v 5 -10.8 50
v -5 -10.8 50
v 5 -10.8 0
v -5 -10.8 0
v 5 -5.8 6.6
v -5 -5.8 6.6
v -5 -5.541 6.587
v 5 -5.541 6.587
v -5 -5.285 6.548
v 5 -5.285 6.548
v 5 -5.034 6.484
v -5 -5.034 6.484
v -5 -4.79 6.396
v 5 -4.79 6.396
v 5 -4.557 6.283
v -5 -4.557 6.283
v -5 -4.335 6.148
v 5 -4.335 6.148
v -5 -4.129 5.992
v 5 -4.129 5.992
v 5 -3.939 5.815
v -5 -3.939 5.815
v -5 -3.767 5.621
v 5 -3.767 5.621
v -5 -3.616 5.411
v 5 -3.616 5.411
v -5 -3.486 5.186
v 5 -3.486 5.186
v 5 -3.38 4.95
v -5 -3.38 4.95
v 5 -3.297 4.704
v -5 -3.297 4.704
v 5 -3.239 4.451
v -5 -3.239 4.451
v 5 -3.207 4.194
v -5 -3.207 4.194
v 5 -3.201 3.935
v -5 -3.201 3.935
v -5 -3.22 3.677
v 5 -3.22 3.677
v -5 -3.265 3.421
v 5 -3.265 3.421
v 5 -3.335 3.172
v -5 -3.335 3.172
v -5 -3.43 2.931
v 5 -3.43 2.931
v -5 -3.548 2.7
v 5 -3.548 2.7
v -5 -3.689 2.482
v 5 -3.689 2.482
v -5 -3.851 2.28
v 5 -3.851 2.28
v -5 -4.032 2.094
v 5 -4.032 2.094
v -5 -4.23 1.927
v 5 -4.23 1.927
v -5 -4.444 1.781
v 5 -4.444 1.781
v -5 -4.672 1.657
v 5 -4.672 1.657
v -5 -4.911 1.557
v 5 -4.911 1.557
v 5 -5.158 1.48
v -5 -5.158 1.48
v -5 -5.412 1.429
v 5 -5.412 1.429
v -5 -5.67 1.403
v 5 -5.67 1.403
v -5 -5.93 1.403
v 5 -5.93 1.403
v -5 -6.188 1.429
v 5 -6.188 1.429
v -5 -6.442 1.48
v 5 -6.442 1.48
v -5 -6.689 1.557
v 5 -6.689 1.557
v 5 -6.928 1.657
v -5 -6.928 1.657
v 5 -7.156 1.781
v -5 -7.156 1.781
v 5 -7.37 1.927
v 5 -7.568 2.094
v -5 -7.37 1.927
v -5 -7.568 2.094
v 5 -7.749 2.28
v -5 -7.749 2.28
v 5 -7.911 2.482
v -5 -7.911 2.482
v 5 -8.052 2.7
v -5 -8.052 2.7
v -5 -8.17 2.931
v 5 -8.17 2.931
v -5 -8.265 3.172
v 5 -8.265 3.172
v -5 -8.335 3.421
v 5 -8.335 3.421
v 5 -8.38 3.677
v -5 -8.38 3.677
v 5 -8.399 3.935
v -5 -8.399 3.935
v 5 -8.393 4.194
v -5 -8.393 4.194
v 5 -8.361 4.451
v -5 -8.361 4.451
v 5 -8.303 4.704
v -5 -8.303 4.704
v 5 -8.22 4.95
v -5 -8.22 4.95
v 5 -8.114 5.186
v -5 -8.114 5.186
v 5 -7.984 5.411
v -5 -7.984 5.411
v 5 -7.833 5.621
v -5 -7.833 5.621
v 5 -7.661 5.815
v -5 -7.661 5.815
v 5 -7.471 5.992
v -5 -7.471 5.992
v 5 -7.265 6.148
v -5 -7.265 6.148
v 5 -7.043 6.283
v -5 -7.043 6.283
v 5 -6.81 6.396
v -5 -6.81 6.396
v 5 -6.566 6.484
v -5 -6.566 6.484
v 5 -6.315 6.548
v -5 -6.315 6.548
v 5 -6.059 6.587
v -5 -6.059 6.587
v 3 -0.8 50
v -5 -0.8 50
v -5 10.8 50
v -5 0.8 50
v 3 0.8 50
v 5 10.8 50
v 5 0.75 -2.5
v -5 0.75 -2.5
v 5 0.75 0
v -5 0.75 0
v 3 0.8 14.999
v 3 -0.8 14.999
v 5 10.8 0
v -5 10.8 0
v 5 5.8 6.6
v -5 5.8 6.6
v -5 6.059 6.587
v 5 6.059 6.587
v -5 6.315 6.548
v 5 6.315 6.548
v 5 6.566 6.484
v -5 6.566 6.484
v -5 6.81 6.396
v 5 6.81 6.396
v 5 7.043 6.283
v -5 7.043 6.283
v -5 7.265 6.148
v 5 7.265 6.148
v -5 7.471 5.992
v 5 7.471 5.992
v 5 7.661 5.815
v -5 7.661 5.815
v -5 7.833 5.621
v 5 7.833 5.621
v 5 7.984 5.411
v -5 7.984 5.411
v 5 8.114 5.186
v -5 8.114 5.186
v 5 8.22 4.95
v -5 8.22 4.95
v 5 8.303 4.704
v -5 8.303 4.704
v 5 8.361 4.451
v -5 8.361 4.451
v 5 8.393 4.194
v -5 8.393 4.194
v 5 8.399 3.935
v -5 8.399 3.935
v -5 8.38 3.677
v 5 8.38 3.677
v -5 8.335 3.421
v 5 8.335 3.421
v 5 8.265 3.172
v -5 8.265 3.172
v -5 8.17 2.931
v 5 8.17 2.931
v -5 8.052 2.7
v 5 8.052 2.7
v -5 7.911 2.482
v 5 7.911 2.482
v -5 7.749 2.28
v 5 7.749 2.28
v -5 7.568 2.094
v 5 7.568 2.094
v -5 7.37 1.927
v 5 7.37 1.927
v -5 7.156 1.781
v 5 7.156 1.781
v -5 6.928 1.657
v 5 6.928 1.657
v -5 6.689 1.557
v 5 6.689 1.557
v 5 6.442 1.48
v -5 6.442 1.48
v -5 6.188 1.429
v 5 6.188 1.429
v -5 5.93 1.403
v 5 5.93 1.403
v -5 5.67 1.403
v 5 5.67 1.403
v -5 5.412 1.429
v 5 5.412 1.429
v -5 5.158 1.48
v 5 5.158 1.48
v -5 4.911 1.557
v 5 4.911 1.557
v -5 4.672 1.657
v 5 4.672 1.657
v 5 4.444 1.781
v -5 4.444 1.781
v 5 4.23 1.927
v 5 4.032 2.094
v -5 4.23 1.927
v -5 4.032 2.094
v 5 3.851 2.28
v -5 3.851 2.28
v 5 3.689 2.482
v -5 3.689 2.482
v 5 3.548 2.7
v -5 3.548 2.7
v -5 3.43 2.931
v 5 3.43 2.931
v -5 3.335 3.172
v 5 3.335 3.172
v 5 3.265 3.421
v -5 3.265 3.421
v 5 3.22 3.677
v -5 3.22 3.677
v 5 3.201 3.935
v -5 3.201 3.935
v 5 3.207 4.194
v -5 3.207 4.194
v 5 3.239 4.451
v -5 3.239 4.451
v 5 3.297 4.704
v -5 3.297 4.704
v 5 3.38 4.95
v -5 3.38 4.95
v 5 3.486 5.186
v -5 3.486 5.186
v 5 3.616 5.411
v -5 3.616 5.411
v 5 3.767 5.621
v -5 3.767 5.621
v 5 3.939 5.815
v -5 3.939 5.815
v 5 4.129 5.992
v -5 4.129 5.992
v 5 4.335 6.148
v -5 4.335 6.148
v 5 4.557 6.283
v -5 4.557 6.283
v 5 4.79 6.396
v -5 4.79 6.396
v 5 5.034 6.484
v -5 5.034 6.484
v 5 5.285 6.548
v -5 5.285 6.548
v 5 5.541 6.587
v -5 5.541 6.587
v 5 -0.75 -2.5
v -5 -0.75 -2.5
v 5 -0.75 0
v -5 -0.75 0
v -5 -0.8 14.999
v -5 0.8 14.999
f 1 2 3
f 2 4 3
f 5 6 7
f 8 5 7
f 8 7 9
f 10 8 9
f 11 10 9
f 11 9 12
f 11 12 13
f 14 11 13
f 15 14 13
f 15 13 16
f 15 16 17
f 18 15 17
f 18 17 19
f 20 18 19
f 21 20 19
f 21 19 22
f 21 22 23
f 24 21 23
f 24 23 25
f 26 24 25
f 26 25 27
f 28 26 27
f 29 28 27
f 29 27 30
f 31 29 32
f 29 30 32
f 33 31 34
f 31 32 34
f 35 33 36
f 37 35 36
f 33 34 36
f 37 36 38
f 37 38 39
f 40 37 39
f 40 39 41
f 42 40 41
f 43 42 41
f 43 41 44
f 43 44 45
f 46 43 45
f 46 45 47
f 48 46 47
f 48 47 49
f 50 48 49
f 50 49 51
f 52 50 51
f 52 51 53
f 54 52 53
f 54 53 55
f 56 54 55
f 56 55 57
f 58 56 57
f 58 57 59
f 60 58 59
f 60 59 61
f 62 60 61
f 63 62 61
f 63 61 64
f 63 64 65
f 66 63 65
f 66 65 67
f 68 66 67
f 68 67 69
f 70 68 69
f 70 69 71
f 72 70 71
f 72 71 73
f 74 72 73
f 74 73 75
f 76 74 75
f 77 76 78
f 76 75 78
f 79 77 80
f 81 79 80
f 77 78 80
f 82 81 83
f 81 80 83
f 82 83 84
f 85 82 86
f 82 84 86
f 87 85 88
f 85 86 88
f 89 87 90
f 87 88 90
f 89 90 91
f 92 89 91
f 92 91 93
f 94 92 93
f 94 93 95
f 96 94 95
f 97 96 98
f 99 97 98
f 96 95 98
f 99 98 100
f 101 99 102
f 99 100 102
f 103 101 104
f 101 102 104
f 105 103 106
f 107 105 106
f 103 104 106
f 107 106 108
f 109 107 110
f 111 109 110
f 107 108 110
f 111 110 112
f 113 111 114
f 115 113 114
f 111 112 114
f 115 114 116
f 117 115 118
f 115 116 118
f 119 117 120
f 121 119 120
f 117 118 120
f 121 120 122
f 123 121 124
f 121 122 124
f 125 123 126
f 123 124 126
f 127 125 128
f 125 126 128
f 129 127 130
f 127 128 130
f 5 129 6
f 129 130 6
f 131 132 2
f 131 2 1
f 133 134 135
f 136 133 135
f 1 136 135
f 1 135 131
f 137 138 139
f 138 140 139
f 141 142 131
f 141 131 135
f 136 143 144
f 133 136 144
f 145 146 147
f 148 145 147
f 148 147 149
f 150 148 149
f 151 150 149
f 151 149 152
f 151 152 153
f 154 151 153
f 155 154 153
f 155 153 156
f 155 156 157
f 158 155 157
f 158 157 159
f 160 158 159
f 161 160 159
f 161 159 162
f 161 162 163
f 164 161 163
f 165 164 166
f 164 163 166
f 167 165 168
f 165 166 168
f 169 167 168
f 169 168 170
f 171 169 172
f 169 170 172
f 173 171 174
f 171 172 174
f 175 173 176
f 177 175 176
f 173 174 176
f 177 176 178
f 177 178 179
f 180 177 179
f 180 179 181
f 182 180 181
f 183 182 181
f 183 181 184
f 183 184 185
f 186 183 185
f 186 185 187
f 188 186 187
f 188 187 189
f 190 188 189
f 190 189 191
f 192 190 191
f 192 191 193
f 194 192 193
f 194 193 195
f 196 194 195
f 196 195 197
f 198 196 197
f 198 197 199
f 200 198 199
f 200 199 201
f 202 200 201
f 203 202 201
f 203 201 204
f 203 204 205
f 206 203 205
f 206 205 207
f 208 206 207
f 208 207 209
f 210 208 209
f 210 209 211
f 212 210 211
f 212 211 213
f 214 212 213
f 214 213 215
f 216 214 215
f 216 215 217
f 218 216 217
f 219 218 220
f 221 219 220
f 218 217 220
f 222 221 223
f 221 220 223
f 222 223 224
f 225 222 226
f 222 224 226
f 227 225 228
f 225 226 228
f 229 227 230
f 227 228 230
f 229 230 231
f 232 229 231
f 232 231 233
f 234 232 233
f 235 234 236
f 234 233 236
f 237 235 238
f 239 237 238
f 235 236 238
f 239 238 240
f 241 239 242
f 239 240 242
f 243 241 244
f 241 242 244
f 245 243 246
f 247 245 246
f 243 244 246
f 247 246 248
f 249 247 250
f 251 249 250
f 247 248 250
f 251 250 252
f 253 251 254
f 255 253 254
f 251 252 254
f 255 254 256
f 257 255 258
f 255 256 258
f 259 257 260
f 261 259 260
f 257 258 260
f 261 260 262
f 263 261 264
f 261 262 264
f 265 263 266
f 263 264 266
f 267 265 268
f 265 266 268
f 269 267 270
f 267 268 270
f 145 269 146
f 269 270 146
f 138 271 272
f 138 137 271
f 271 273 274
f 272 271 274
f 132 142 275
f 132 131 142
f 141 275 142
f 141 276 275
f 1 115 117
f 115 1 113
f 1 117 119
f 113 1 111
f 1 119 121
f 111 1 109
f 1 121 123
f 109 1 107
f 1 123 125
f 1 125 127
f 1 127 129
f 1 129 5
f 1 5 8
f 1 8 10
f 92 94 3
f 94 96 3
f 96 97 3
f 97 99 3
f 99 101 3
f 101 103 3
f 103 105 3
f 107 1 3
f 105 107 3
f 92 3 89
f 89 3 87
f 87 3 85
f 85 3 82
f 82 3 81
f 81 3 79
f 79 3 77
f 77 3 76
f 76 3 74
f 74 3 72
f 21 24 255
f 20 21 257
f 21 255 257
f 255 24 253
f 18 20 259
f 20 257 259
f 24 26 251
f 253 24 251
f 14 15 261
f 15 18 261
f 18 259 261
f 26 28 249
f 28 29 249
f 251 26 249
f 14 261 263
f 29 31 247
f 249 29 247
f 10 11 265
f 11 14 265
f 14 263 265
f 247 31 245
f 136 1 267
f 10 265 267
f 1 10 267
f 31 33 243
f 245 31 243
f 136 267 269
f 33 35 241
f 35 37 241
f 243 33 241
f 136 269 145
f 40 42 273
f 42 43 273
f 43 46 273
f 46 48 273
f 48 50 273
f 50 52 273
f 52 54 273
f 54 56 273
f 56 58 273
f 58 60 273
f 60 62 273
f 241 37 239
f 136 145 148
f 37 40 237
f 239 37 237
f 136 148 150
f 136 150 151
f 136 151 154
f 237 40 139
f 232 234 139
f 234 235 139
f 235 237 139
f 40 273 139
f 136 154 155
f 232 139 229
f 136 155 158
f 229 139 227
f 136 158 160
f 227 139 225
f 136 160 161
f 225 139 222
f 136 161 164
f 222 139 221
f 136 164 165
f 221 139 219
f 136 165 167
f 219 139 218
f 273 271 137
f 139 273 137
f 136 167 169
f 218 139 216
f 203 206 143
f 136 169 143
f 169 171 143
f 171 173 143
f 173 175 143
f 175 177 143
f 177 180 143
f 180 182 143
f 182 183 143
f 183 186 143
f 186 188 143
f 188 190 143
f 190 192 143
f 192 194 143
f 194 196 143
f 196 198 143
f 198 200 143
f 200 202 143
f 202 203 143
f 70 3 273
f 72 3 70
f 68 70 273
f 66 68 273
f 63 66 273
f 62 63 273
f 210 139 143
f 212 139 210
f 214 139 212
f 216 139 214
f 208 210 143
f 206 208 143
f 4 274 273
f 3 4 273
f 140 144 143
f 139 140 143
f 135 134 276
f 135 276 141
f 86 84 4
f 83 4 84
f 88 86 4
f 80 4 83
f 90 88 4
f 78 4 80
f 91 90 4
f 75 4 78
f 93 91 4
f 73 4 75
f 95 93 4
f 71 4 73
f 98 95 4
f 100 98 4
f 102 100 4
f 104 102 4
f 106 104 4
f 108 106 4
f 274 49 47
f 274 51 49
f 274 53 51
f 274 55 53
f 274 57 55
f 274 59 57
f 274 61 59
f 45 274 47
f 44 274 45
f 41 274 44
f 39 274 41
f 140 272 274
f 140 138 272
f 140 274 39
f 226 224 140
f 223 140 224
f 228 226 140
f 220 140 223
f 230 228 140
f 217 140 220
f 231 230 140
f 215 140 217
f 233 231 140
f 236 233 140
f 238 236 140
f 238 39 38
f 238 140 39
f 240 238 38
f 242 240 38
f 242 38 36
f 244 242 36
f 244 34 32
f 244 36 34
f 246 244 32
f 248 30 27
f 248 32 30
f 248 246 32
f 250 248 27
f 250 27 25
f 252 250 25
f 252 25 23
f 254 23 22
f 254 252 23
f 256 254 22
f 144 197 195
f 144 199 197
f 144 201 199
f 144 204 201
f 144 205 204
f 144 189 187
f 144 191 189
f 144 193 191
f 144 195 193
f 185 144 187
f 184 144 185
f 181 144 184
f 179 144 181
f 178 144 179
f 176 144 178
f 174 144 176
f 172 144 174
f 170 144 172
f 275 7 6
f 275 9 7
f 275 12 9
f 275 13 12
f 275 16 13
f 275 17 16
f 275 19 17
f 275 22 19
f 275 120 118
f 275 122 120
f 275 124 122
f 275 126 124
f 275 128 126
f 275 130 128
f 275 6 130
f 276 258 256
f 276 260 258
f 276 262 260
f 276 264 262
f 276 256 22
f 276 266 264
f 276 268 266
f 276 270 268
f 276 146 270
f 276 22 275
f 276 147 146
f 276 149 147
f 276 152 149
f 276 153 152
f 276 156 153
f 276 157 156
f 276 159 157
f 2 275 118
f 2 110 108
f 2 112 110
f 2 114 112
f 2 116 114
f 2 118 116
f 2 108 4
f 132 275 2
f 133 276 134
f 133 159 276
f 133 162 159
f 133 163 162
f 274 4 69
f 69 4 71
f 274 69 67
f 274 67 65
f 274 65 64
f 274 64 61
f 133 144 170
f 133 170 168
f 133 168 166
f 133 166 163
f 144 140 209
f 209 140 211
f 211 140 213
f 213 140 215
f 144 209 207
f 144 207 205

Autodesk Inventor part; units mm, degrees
ref_plane "YZ Plane" through (0, 0, 0) normal (1, 0, 0) x (0, 1, 0)
ref_plane "XZ Plane" through (0, 0, 0) normal (0, 1, 0) x (-1, 0, 0)
ref_plane "XY Plane" through (0, 0, 0) normal (0, 0, 1) x (1, 0, 0)
sketch "Skizze1" plane through (0, 0, 0) normal (0, 0, 1) x (1, 0, 0)
  line L0 (-5, -10.8) -> (5, -10.8)
  line L1 (5, -10.8) -> (5, 10.8)
  line L2 (5, 10.8) -> (-5, 10.8)
  line L3 (-5, 10.8) -> (-5, -10.8)
  line L4 (-5, -10.8) -> (5, 10.8) construction
  line L5 (5, -10.8) -> (-5, 10.8) construction
  point P0 (0, 0)
  dimension "d0" = 10
  dimension "d1" = 21.6
extrude "Extrusion1" add sketch "Skizze1" along normal blind 50
sketch "Skizze2" plane through (0, 0, 50) normal (0, 0, 1) x (1, 0, 0)
  line L0 (-5, 10.8) -> (-5, -10.8) projected
  line L1 (-5, 0.8) -> (3, 0.8)
  line L2 (3, 0.8) -> (3, -0.8)
  line L3 (3, -0.8) -> (-5, -0.8)
  line L4 (-5, -0.8) -> (-5, 0.8)
  line L5 (5, -10.8) -> (5, 10.8) projected
  point P0 (0, 0)
  dimension "d4" = 1.6
  dimension "d5" = 0.8
  dimension "d7" = 2
extrude "Extrusion2" cut sketch "Skizze2" against normal blind 36
sketch "Skizze3" plane through (5, -10.8, 0) normal (1, 0, 0) x (0, 0, -1)
  point P0 (0, 10.8)
sketch "Skizze4" plane through (-5, 10.8, 0) normal (-1, 0, 0) x (0, 0, 1)
  line L0 (0, 0) -> (0, -21.6) projected
  line L1 (0, 0) -> (0, -21.6) projected
  line L2 (0, -21.6) -> (50, -21.6) projected
  line L3 (0, 0) -> (50, 0) projected
  circle A0 centre (4, -5) radius 2.6
  circle A1 centre (4, -16.6) radius 2.6
  point P0 (0, -10.8)
  point P1 (0, -10)
  point P2 (0, -11.6)
  dimension "d10" = 4
  dimension "d11" = 4
  dimension "d12" = 5
  dimension "d13" = 5
  dimension "d14" = 5.2
  dimension "d15" = 5.2
extrude "Extrusion3" cut sketch "Skizze4" against normal blind 35
sketch "Skizze5" plane through (0, 0, 0) normal (0, 0, -1) x (-1, 0, 0)
  line L0 (-5, -0.75) -> (5, -0.75)
  line L1 (5, -0.75) -> (5, 0.75)
  line L2 (5, 0.75) -> (-5, 0.75)
  line L3 (-5, 0.75) -> (-5, -0.75)
  line L4 (-5, -10.8) -> (-5, 10.8) projected
  point P0 (0, 0)
  point P1 (-5, 0)
  dimension "d18" = 1.5
  dimension "d19" = 10
  dimension "d20" = 0
  dimension "d21" = 0.75
extrude "Extrusion4" add sketch "Skizze5" along normal blind 2.5
sketch "Skizze7" plane through (-5, 0.8, 50) normal (0, -1, 0) x (1, 0, 0)
  line L0 (0, -36) -> (0, 0) projected
  line L1 (10, -50) -> (0, -50)
  line L2 (0, -50) -> (0, -33.9849)
  line L3 (0, -33.9849) -> (10, -33.9849)
  line L4 (10, -33.9849) -> (10, -50)
  point P0 (5, -50)
  point P1 (0, -35)
extrude "Extrusion5" add sketch "Skizze7" along normal blind 2.5
sketch "Skizze8" plane through (-5, 0.8, 16.0151) normal (0, 0, 1) x (1, 0, 0)
  line L0 (0, 0) -> (8, 0) projected
  line L1 (8, -1.6) -> (0, -1.6) projected
  line L2 (8, 0) -> (0, 0)
  line L3 (0, 0) -> (0, -1.6)
  line L4 (0, -1.6) -> (8, -1.6)
  line L5 (8, -1.6) -> (8, 0)
  point P0 (5, -0.8)
extrude "Extrusion6" cut sketch "Skizze8" against normal blind 1.016
properties part number "Objektträgerhalterung PHM Projekt Gegenstück"
